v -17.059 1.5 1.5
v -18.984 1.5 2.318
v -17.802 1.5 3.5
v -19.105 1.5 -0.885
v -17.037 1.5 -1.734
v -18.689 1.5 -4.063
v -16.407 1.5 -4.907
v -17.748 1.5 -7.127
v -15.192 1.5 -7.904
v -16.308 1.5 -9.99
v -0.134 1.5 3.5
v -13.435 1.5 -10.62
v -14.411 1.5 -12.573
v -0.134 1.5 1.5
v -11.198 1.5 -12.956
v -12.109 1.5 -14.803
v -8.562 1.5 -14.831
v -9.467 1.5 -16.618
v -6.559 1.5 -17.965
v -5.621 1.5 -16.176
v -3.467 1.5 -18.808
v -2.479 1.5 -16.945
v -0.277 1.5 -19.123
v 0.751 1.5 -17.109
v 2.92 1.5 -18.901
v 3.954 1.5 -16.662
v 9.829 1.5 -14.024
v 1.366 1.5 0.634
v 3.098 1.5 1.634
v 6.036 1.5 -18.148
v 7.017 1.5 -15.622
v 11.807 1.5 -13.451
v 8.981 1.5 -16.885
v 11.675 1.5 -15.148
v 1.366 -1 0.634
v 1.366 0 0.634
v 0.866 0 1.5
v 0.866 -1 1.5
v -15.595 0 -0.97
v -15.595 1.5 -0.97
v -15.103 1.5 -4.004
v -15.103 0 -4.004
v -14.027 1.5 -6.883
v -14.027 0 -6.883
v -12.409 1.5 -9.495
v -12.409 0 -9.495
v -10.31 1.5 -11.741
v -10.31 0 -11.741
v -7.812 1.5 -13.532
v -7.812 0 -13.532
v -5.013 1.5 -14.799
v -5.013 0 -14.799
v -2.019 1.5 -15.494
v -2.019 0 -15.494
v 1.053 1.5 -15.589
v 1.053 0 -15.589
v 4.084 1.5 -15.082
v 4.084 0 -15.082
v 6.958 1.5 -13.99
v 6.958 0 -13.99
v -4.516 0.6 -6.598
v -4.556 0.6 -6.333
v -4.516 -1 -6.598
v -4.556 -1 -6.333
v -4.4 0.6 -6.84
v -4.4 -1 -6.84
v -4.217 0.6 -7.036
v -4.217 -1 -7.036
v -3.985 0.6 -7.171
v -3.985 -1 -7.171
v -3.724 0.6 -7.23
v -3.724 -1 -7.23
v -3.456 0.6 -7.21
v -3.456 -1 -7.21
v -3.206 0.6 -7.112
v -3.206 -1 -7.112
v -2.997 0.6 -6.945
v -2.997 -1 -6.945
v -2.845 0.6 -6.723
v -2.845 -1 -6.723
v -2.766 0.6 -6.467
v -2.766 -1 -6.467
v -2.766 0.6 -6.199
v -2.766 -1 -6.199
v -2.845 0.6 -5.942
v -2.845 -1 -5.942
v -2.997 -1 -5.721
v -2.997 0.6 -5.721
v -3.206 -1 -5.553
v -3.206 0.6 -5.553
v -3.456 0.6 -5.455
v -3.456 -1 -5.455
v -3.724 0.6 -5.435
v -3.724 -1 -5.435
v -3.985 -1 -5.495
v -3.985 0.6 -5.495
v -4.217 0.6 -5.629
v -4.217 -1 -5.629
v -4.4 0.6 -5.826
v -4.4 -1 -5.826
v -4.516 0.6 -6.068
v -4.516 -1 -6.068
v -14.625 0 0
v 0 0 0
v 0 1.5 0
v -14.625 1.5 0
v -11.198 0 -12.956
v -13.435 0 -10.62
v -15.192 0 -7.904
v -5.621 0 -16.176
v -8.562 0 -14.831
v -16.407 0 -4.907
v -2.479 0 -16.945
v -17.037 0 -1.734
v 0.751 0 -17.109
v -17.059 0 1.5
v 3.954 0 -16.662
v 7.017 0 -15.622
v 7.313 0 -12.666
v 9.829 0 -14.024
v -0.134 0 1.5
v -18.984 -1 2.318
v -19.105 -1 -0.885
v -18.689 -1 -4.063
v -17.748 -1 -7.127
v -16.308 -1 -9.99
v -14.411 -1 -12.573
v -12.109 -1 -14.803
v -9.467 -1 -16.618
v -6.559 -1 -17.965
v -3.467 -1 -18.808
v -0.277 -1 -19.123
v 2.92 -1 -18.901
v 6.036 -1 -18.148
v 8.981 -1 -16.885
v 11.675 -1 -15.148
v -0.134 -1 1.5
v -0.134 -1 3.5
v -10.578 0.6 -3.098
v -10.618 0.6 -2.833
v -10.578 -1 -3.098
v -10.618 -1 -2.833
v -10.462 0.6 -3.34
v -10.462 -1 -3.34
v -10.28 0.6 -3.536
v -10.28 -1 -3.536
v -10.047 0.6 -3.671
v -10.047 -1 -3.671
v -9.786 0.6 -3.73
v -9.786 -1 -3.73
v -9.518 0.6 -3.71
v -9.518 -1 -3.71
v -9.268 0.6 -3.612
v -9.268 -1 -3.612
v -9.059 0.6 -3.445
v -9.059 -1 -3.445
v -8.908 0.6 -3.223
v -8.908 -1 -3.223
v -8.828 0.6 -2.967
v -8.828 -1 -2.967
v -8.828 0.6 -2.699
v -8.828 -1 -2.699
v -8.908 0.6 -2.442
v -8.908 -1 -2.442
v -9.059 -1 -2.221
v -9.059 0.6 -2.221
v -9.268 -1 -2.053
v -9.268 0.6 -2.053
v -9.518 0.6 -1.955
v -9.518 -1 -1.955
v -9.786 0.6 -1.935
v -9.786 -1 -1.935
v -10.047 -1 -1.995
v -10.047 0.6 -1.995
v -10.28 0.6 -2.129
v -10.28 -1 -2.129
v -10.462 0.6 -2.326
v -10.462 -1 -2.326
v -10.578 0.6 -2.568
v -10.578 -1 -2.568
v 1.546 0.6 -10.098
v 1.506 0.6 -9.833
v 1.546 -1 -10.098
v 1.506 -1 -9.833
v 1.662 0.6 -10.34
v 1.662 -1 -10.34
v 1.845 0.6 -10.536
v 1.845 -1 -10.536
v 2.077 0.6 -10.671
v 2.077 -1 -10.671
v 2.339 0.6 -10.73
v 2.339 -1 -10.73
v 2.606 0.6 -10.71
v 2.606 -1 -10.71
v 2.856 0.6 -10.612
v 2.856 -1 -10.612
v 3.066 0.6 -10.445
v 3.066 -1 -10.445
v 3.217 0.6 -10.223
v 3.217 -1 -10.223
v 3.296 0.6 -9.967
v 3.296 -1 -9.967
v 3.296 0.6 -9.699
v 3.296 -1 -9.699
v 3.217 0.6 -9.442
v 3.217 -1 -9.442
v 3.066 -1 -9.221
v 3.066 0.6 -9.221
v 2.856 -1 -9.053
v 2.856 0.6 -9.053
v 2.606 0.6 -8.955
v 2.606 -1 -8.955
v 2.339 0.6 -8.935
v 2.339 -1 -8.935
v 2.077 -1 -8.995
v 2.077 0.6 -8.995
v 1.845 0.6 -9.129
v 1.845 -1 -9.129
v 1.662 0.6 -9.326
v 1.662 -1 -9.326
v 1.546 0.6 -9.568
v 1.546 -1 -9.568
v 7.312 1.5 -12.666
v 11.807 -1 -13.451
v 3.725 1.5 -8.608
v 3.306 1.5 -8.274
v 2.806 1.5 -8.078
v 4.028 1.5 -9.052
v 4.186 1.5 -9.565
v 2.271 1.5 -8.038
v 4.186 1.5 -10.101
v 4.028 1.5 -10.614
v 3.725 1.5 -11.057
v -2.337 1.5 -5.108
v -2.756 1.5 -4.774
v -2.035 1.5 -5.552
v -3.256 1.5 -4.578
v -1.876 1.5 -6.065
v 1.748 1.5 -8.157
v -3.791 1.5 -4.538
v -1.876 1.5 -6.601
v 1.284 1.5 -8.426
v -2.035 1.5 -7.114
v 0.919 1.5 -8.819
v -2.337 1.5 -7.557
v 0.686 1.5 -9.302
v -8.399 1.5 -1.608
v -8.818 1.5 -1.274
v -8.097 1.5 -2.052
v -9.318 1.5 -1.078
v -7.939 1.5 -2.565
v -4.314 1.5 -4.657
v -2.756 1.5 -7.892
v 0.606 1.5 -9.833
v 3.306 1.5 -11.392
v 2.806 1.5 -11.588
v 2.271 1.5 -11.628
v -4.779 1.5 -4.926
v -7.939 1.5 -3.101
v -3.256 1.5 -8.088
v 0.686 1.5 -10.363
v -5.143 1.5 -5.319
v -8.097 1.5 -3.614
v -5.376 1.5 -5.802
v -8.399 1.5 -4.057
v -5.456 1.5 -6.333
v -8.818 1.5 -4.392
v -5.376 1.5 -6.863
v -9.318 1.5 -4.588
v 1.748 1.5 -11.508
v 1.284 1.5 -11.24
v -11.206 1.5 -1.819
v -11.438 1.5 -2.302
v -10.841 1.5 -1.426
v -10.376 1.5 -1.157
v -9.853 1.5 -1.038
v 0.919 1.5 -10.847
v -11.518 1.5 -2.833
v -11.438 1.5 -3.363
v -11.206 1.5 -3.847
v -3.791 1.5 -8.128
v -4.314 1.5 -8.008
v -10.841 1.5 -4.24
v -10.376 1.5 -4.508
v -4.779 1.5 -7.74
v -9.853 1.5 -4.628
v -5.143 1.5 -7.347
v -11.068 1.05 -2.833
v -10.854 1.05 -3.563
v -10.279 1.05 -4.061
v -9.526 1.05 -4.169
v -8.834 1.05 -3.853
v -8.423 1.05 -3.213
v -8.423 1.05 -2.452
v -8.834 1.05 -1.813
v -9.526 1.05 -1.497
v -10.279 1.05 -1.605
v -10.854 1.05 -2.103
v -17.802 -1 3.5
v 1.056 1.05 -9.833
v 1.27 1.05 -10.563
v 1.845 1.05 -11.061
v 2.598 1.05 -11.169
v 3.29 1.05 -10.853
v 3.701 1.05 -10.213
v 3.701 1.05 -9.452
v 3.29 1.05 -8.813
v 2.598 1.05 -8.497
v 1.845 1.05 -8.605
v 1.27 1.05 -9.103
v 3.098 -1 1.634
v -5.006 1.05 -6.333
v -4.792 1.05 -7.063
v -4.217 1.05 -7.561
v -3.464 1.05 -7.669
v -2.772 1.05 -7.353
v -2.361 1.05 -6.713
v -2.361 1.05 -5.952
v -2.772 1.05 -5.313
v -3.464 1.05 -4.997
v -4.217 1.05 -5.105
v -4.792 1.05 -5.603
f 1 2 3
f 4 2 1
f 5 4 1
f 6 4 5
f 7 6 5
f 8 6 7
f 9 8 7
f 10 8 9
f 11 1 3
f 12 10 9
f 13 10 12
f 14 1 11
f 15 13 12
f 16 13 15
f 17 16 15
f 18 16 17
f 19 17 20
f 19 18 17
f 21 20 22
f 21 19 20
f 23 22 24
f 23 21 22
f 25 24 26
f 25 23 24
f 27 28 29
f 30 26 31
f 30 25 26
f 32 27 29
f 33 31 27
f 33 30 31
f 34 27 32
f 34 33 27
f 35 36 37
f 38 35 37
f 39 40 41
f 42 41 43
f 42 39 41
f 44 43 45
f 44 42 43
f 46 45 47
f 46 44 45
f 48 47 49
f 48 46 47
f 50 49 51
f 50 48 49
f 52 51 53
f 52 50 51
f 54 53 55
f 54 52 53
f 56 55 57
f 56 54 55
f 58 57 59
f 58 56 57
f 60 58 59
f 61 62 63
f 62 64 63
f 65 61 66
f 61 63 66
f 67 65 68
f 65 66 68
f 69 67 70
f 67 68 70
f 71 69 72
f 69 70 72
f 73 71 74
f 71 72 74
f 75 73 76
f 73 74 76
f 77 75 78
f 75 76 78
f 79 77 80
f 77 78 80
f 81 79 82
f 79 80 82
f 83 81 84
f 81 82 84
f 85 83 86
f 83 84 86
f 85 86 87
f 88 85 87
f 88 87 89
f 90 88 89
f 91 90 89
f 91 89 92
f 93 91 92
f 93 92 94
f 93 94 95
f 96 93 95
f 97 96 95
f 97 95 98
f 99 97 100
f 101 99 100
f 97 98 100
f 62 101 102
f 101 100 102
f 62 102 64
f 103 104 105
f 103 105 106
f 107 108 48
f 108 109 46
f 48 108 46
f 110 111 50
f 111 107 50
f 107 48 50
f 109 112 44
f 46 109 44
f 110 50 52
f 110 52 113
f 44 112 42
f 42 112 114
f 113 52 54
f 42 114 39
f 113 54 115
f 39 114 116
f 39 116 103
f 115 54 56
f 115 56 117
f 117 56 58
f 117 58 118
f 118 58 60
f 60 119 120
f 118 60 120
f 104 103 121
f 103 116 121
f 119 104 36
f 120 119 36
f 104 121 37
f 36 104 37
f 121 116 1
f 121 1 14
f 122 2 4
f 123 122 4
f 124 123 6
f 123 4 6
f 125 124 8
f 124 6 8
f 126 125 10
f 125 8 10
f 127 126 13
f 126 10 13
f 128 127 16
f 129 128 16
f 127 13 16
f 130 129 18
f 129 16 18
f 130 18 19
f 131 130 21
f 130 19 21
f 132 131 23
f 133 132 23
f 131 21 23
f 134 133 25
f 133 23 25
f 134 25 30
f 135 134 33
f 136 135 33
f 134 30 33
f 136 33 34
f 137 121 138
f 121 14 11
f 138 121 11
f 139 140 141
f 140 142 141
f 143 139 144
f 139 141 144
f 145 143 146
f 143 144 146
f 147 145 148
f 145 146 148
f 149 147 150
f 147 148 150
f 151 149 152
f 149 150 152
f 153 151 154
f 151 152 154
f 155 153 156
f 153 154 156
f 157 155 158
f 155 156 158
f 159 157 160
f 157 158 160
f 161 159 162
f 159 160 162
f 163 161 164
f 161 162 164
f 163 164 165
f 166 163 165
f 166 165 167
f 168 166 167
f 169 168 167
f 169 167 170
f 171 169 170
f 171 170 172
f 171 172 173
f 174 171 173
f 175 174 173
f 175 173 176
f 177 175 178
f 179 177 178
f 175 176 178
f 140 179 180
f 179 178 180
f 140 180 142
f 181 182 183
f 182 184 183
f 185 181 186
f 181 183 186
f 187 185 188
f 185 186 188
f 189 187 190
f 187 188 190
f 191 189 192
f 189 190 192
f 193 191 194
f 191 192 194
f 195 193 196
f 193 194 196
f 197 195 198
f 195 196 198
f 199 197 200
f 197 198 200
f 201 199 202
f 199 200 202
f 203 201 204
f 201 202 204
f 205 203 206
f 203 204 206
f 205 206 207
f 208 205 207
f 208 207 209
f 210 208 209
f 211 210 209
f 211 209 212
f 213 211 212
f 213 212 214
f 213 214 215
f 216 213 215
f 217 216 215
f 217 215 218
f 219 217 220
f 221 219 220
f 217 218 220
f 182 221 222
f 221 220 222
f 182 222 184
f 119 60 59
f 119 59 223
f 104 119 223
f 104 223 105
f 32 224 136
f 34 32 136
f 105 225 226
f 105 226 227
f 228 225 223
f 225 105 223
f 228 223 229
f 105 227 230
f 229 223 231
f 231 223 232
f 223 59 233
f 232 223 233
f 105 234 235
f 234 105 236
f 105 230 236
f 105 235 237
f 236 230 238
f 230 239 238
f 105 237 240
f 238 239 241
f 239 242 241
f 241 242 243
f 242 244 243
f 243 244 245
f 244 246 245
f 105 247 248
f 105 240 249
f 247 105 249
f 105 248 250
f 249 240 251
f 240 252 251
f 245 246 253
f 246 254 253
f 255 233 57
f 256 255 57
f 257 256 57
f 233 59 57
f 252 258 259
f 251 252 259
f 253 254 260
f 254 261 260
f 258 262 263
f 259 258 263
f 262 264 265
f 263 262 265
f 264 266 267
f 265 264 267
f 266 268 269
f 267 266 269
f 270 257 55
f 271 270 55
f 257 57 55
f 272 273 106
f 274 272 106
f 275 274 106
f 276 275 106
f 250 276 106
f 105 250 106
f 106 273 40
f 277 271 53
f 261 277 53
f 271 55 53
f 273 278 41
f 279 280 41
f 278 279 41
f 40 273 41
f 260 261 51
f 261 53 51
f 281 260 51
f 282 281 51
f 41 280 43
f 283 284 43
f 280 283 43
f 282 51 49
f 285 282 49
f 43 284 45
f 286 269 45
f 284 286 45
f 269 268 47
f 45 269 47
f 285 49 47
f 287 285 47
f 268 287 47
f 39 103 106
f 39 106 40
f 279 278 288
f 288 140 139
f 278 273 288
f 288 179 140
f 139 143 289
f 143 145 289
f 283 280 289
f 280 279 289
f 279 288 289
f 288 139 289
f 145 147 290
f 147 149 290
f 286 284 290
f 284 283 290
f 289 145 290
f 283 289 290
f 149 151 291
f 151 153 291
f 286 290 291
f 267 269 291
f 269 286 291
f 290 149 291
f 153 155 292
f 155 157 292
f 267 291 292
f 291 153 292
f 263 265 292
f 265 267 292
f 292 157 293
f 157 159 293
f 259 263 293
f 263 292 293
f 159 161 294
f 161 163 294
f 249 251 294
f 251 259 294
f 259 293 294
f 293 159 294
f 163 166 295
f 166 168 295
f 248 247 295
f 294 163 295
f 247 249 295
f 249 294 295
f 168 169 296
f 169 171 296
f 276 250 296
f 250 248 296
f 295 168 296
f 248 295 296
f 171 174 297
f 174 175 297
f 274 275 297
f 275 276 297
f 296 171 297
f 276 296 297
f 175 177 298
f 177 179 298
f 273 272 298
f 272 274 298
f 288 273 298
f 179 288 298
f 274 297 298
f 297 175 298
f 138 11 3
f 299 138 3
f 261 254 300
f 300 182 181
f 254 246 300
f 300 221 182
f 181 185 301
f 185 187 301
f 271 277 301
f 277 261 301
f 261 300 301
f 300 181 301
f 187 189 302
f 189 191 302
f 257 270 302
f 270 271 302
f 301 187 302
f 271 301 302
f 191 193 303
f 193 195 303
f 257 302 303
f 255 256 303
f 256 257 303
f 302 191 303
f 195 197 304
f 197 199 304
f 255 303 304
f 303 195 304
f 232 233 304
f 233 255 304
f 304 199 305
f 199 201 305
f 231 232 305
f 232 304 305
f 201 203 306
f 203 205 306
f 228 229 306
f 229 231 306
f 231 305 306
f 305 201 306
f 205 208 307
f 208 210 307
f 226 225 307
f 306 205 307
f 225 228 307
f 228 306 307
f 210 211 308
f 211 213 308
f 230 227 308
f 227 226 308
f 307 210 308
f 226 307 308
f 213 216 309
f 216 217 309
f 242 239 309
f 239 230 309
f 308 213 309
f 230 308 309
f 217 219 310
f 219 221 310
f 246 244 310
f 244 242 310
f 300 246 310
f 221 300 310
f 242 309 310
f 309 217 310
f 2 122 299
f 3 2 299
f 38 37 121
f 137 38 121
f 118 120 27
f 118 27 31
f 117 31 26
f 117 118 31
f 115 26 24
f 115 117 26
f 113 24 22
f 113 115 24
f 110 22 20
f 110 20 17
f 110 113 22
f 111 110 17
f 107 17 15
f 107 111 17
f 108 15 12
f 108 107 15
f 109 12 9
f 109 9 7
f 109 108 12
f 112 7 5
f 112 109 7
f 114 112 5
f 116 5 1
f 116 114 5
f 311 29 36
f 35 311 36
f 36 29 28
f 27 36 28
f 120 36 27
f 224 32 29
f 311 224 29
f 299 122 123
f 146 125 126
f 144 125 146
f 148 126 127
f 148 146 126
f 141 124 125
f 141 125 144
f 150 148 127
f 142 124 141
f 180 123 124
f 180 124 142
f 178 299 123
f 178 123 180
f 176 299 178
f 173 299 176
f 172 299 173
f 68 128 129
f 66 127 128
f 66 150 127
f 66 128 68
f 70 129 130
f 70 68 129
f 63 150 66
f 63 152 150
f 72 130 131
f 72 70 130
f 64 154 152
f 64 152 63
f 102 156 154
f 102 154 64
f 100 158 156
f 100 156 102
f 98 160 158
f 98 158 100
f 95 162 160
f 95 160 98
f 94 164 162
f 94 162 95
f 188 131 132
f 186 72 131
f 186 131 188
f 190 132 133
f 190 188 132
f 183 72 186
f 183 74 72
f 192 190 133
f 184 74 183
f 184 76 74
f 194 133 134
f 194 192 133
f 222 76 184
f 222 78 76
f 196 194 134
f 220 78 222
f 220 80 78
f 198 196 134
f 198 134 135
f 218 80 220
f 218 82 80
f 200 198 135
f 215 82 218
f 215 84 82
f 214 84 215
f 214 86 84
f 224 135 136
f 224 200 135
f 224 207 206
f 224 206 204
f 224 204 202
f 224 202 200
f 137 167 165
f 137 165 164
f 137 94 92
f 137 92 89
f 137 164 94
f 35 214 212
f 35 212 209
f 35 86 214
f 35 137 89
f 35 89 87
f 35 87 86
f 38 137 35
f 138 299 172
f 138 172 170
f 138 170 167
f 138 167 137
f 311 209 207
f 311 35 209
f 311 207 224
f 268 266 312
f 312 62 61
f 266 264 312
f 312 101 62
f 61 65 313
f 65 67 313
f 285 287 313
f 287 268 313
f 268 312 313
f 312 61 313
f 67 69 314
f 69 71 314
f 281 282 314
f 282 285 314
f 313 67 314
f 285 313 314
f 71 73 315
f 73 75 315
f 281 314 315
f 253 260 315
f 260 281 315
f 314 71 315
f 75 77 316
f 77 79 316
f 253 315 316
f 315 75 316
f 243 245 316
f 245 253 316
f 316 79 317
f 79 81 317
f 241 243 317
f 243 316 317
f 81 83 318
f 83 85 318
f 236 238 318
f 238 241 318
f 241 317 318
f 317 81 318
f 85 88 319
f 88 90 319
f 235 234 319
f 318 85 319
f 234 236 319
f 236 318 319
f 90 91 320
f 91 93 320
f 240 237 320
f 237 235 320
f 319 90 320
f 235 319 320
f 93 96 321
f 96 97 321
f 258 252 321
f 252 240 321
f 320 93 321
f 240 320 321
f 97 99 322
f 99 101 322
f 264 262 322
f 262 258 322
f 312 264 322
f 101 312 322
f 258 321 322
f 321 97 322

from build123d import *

# Parameters (mm, degrees)
BOSS_EXTRUDE8_DEPTH                                  = 1.5
BOSS_EXTRUDE9_START                                  = -1.5
BOSS_EXTRUDE9_DEPTH                                  = 1.5
BOSS_EXTRUDE10_DEPTH                                 = 1
CHAMFER2_SIZE                                        = 1
CUT_EXTRUDE6_DEPTH                                   = 28.162128967
CHAMFER5_SIZE                                        = 1.249835708
CHAMFER5_SIZE_2                                      = 1
CSK_FOR_M1_6_COUNTERSUNK_FLAT_HEAD_SCREW_D           = 1.8
CSK_FOR_M1_6_COUNTERSUNK_FLAT_HEAD_SCREW_DEPTH       = 2.5
CSK_FOR_M1_6_COUNTERSUNK_FLAT_HEAD_SCREW_CSINK_D     = 3.6
CSK_FOR_M1_6_COUNTERSUNK_FLAT_HEAD_SCREW_CSINK_ANGLE = 90
CSK_FOR_M1_6_COUNTERSUNK_FLAT_HEAD_SCREW_TIP         = 0.540774557


with BuildPart() as part:
    # Sketch15 → Boss-Extrude8 (new body)
    with BuildSketch(Plane(origin=(0, 0, 0), x_dir=(1, 0, 0), z_dir=(0, 1, 0))):
        with BuildLine():
            Line((0, 0), (-15.625, 0))
            ThreePointArc((-15.625, 0), (-7.8125, 13.531646934), (7.8125, 13.531646934))
            Line((7.8125, 13.531646934), (0, 0))
        make_face()
    extrude(amount=BOSS_EXTRUDE8_DEPTH)



with BuildPart() as body_2:
    # Sketch16 → Boss-Extrude9 (new body)
    with BuildSketch(Plane(origin=(0, 1.5, 0), x_dir=(1, 0, 0), z_dir=(0, 1, 0)).offset(BOSS_EXTRUDE9_START)):
        with BuildLine():
            Line((2.020725942, -3.5), (12.432094511, 14.533019338))
            ThreePointArc((12.432094511, 14.533019338), (-9.5625, 16.562735847), (-18.802011196, -3.5))
            Line((-18.802011196, -3.5), (2.020725942, -3.5))
        make_face()
        with BuildLine():
            Line((0.866025404, -1.5), (9.828628146, 14.023683317))
            ThreePointArc((9.828628146, 14.023683317), (-8.5625, 14.83068504), (-17.05918008, -1.5))
            Line((-17.05918008, -1.5), (0.866025404, -1.5))
        make_face(mode=Mode.SUBTRACT)
    extrude(amount=BOSS_EXTRUDE9_DEPTH)


with BuildPart() as part_1:
    add(part.part)

    add(body_2.part)  # Boss-Extrude10 merges body 2
    # Sketch17 → Boss-Extrude10 (add)
    with BuildSketch(Plane.XZ):
        with BuildLine():
            Line((12.432094511, -14.533019338), (2.020725942, 3.5))
            Line((2.020725942, 3.5), (-18.802011196, 3.5))
            ThreePointArc((-18.802011196, 3.5), (-9.5625, -16.562735847), (12.432094511, -14.533019338))
        make_face()
    extrude(amount=BOSS_EXTRUDE10_DEPTH)

    # Chamfer2
    # the kernel refuses this chamfer: 1 mm, written as the material it takes off along each edge
    with BuildSketch(Plane(origin=(-15.625, 0, 0), x_dir=(1, 0, 0), z_dir=(0, 1, 0))) as chamfer2_piece_1:
        with BuildLine():
            Line((CHAMFER2_SIZE, 0), (0.030129793, 0.969870207))
            ThreePointArc((0.030129793, 0.969870207), (0.007965345, 0.498852279), (0, 0))
            Line((0, 0), (CHAMFER2_SIZE, 0))
        make_face()
    extrude(amount=4.071682988, mode=Mode.SUBTRACT)
    with BuildSketch(Plane(origin=(7.8125, 0, -13.531646934), x_dir=(-0.8811332220086912, 0, -0.4728681053661608), z_dir=(0, 1, 0))) as chamfer2_piece_2:
        with BuildLine():
            Line((0.970338097, 0), (CHAMFER2_SIZE * 0.0310508191178, CHAMFER2_SIZE * 0.999517807061))
            Line((CHAMFER2_SIZE * 0.0310508191178, CHAMFER2_SIZE * 0.999517807061), (0, 0))
            ThreePointArc((0, 0), (0.498859067, -0.007528267), (0.970338097, 0))
        make_face()
    extrude(amount=4.071682988, mode=Mode.SUBTRACT)

    # Sketch19 → Cut-Extrude6 (cut, through all)
    with BuildSketch(Plane(origin=(0, 1.5, 0), x_dir=(1, 0, 0), z_dir=(0, 1, 0))):
        Polygon((-0.133974596, -1.5), (-0.133974596, -3.5), (2.020725942, -3.5), (3.098076211, -1.633974596), (1.366025404, -0.633974596), (0.866025404, -1.5), align=None)
    extrude(amount=-CUT_EXTRUDE6_DEPTH, mode=Mode.SUBTRACT)

    # Chamfer5
    # the kernel refuses this chamfer: 1.249835708, 1 mm, written as the material it takes off along each edge
    with BuildSketch(Plane(origin=(12.432094511, -4.228421452, -14.533019338), x_dir=(-0.500000000000006, 0, 0.8660254037844353), z_dir=(0, 1, 0))) as chamfer5_piece_1:
        with BuildLine():
            Line((CHAMFER5_SIZE, 0), (-0.153998799, -0.963208706))
            ThreePointArc((-0.153998799, -0.963208706), (-0.08585038, -0.497615929), (0, 0))
            Line((0, 0), (CHAMFER5_SIZE, 0))
        make_face()
    extrude(amount=8.956842905, mode=Mode.SUBTRACT)
    with BuildSketch(Plane(origin=(-18.802011196, -4.09148885, 3.5), x_dir=(-0.1521791167983569, 0, -0.9883529310982349), z_dir=(0, 1, 0))) as chamfer5_piece_2:
        with BuildLine():
            Line((1.195923602, 0), (-CHAMFER5_SIZE_2 * 0.152179116798, -CHAMFER5_SIZE_2 * 0.988352931098))
            Line((-CHAMFER5_SIZE_2 * 0.152179116798, -CHAMFER5_SIZE_2 * 0.988352931098), (0, 0))
            ThreePointArc((0, 0), (0.618115367, 0.009339597), (1.195923602, 0))
        make_face()
    extrude(amount=8.6829777, mode=Mode.SUBTRACT)

    # CSK for M1.6 Countersunk Flat Head Screw1
    with Locations(Plane(origin=(0, 1.5, 0), x_dir=(1, 0, 0), z_dir=(0, 1, 0))):
        with Locations((-3.65625, 6.332810765), (-9.718427826, 2.832810765), (2.405927826, 9.832810765)):
            CounterSinkHole(CSK_FOR_M1_6_COUNTERSUNK_FLAT_HEAD_SCREW_D / 2, CSK_FOR_M1_6_COUNTERSUNK_FLAT_HEAD_SCREW_CSINK_D / 2, depth=CSK_FOR_M1_6_COUNTERSUNK_FLAT_HEAD_SCREW_DEPTH, counter_sink_angle=CSK_FOR_M1_6_COUNTERSUNK_FLAT_HEAD_SCREW_CSINK_ANGLE)
            with Locations((0, 0, -(CSK_FOR_M1_6_COUNTERSUNK_FLAT_HEAD_SCREW_DEPTH + CSK_FOR_M1_6_COUNTERSUNK_FLAT_HEAD_SCREW_TIP / 2))):  # 118° drill point
                Cone(0, CSK_FOR_M1_6_COUNTERSUNK_FLAT_HEAD_SCREW_D / 2, CSK_FOR_M1_6_COUNTERSUNK_FLAT_HEAD_SCREW_TIP, mode=Mode.SUBTRACT)


solid = part_1.part
